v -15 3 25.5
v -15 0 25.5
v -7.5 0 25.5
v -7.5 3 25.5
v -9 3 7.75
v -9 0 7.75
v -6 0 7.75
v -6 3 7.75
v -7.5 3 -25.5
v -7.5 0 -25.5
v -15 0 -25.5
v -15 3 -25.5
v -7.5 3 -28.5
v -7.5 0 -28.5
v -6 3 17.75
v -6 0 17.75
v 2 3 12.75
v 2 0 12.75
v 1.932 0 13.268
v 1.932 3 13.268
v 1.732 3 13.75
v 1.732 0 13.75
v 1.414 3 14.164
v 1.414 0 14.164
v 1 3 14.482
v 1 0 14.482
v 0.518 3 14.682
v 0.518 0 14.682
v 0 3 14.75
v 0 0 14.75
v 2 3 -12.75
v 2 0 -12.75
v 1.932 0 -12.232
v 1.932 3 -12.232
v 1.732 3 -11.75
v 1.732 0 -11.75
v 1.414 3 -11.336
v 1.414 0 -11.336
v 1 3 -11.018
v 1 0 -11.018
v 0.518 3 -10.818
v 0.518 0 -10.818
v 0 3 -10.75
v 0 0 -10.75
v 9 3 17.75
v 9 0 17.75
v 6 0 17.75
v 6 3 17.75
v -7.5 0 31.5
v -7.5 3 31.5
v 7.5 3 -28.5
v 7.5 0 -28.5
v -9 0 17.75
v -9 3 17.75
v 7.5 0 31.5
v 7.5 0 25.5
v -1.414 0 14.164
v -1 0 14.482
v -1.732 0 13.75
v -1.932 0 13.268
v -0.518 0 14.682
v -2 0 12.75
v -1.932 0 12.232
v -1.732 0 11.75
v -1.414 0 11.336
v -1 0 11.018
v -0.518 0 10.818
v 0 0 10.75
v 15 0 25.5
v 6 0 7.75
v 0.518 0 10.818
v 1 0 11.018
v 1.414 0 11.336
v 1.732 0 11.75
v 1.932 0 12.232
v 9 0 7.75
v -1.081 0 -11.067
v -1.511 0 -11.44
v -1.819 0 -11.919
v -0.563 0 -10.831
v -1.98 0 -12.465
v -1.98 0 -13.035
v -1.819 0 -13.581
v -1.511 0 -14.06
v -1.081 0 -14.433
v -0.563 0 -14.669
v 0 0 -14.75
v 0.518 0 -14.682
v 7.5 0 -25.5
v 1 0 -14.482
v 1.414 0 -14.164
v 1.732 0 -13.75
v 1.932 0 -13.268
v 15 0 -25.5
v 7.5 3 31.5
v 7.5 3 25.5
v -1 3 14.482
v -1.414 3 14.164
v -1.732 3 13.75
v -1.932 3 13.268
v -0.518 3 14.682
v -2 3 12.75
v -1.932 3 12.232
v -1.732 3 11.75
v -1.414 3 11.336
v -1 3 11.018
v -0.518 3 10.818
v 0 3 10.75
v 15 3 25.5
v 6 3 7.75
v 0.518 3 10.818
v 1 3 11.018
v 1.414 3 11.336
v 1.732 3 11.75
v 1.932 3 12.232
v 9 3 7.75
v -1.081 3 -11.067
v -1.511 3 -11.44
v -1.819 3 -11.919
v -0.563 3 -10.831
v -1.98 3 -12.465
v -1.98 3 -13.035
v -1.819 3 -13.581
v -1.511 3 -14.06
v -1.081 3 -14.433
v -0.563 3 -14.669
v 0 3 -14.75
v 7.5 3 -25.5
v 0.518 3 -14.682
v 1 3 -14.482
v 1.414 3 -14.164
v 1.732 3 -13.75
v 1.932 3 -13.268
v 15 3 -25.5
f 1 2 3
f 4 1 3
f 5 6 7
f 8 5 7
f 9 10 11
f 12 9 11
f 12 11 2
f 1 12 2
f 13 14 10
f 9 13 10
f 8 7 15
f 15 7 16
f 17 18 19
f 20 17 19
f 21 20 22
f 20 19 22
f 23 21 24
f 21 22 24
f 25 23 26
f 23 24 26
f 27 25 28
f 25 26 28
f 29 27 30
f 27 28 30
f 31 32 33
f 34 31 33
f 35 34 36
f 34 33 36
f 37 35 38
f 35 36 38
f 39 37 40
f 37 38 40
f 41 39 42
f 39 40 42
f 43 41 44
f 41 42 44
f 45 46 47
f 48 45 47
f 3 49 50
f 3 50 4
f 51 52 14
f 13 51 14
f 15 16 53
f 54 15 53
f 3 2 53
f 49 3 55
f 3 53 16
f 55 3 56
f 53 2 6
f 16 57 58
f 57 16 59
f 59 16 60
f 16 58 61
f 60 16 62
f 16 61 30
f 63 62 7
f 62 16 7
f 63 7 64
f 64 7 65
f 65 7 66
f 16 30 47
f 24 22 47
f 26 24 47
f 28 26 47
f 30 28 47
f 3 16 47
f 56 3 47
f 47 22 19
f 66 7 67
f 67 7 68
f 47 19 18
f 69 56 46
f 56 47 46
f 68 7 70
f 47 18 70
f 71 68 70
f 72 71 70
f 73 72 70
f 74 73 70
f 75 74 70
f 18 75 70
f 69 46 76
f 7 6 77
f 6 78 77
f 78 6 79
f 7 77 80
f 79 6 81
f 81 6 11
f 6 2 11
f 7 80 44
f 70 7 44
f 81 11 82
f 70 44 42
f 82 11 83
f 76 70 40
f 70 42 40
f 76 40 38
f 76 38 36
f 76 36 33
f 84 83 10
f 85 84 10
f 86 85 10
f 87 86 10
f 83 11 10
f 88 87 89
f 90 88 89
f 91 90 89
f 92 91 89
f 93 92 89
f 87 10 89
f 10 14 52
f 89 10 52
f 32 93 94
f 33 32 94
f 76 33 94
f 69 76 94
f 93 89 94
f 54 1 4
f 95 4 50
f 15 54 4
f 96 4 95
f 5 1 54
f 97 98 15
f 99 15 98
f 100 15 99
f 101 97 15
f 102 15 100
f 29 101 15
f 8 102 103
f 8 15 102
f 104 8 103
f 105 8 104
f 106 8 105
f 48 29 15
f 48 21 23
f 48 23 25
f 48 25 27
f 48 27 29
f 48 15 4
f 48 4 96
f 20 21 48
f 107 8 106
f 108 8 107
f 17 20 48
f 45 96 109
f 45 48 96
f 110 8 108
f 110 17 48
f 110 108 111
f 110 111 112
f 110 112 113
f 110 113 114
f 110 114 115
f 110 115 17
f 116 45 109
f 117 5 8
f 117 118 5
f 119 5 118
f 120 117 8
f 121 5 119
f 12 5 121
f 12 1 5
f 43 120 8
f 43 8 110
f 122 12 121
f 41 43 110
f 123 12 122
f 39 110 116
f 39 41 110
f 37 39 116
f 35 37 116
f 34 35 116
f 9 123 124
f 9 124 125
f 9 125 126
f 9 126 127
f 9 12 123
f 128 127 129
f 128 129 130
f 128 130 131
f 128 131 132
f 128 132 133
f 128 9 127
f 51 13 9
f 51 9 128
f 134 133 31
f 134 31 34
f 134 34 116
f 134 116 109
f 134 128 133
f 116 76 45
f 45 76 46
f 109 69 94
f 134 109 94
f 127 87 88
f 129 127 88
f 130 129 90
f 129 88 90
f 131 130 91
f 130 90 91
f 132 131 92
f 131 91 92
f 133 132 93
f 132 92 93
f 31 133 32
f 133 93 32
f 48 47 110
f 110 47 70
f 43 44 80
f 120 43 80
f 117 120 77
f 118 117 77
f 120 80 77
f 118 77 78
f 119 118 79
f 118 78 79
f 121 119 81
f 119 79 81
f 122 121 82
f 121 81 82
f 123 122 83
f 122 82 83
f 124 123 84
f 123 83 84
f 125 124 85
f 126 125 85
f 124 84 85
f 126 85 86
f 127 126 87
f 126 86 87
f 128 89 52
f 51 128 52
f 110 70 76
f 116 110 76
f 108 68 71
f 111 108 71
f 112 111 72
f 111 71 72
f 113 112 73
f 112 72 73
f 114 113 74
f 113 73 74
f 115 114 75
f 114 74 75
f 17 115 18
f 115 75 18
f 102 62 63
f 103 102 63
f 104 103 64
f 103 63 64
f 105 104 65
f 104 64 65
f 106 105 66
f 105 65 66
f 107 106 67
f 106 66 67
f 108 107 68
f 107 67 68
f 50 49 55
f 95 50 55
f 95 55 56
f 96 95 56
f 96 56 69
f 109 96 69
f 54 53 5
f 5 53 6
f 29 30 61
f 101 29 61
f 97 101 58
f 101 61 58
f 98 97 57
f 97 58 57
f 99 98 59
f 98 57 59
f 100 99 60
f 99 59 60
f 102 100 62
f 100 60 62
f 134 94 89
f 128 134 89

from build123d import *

# Parameters (mm, degrees)
SKETCH1_W           = 7.5
SKETCH1_H           = 6
BOSS_EXTRUDE1_DEPTH = 3


with BuildPart() as part:
    # Sketch1 → Boss-Extrude1 (new body)
    with BuildSketch(Plane(origin=(0, 0, 0), x_dir=(1, 0, 0), z_dir=(0, 1, 0))):
        with BuildLine():
            Line((0, 14.75), (0, 25.5))
            Line((0, 25.5), (-7.5, 25.5))
            Line((-7.5, 25.5), (-15, 25.5))
            Line((-15, 25.5), (-15, -12.75))
            Line((-15, -12.75), (-9, -12.75))
            Line((-9, -12.75), (-9, -7.75))
            Line((-9, -7.75), (-6, -7.75))
            Line((-6, -7.75), (-6, -12.75))
            Line((-6, -12.75), (-2, -12.75))
            ThreePointArc((-2, -12.75), (-1.414213562, -11.335786438), (0, -10.75))
            Line((0, -10.75), (0, 0))
            Line((0, 0), (0, 10.75))
            ThreePointArc((0, 10.75), (-2, 12.75), (0, 14.75))
        make_face()
        with BuildLine():
            Line((-9, -12.75), (-15, -12.75))
            Line((-15, -12.75), (-15, -25.5))
            Line((-15, -25.5), (-7.5, -25.5))
            Line((-7.5, -25.5), (0, -25.5))
            Line((0, -25.5), (0, -14.75))
            ThreePointArc((0, -14.75), (-1.414213562, -14.164213562), (-2, -12.75))
            Line((-2, -12.75), (-6, -12.75))
            Line((-6, -12.75), (-6, -17.75))
            Line((-6, -17.75), (-9, -17.75))
            Line((-9, -17.75), (-9, -12.75))
        make_face()
        with BuildLine():
            Line((15, -25.5), (15, -12.75))
            Line((15, -12.75), (9, -12.75))
            Line((9, -12.75), (9, -17.75))
            Line((9, -17.75), (6, -17.75))
            Line((6, -17.75), (6, -12.75))
            Line((6, -12.75), (2, -12.75))
            ThreePointArc((2, -12.75), (1.414213562, -14.164213562), (0, -14.75))
            Line((0, -14.75), (0, -25.5))
            Line((0, -25.5), (7.5, -25.5))
            Line((7.5, -25.5), (15, -25.5))
        make_face()
        with BuildLine():
            Line((7.5, 25.5), (0, 25.5))
            Line((0, 25.5), (0, 14.75))
            ThreePointArc((0, 14.75), (1.414213562, 14.164213562), (2, 12.75))
            ThreePointArc((2, 12.75), (1.414213562, 11.335786438), (0, 10.75))
            Line((0, 10.75), (0, 0))
            Line((0, 0), (0, -10.75))
            ThreePointArc((0, -10.75), (1.414213562, -11.335786438), (2, -12.75))
            Line((2, -12.75), (6, -12.75))
            Line((6, -12.75), (6, -7.75))
            Line((6, -7.75), (9, -7.75))
            Line((9, -7.75), (9, -12.75))
            Line((9, -12.75), (15, -12.75))
            Line((15, -12.75), (15, 25.5))
            Line((15, 25.5), (7.5, 25.5))
        make_face()
        Polygon((-7.5, 25.5), (0, 25.5), (7.5, 25.5), (7.5, 28.5), (-7.5, 28.5), align=None)
        Polygon((-7.5, 25.5), (0, 25.5), (7.5, 25.5), (7.5, 28.5), (-7.5, 28.5), align=None)
        with Locations((-3.75, -28.5)):
            Rectangle(SKETCH1_W, SKETCH1_H)
        with Locations((3.75, -28.5)):
            Rectangle(SKETCH1_W, SKETCH1_H)
    extrude(amount=BOSS_EXTRUDE1_DEPTH)


solid = part.part
